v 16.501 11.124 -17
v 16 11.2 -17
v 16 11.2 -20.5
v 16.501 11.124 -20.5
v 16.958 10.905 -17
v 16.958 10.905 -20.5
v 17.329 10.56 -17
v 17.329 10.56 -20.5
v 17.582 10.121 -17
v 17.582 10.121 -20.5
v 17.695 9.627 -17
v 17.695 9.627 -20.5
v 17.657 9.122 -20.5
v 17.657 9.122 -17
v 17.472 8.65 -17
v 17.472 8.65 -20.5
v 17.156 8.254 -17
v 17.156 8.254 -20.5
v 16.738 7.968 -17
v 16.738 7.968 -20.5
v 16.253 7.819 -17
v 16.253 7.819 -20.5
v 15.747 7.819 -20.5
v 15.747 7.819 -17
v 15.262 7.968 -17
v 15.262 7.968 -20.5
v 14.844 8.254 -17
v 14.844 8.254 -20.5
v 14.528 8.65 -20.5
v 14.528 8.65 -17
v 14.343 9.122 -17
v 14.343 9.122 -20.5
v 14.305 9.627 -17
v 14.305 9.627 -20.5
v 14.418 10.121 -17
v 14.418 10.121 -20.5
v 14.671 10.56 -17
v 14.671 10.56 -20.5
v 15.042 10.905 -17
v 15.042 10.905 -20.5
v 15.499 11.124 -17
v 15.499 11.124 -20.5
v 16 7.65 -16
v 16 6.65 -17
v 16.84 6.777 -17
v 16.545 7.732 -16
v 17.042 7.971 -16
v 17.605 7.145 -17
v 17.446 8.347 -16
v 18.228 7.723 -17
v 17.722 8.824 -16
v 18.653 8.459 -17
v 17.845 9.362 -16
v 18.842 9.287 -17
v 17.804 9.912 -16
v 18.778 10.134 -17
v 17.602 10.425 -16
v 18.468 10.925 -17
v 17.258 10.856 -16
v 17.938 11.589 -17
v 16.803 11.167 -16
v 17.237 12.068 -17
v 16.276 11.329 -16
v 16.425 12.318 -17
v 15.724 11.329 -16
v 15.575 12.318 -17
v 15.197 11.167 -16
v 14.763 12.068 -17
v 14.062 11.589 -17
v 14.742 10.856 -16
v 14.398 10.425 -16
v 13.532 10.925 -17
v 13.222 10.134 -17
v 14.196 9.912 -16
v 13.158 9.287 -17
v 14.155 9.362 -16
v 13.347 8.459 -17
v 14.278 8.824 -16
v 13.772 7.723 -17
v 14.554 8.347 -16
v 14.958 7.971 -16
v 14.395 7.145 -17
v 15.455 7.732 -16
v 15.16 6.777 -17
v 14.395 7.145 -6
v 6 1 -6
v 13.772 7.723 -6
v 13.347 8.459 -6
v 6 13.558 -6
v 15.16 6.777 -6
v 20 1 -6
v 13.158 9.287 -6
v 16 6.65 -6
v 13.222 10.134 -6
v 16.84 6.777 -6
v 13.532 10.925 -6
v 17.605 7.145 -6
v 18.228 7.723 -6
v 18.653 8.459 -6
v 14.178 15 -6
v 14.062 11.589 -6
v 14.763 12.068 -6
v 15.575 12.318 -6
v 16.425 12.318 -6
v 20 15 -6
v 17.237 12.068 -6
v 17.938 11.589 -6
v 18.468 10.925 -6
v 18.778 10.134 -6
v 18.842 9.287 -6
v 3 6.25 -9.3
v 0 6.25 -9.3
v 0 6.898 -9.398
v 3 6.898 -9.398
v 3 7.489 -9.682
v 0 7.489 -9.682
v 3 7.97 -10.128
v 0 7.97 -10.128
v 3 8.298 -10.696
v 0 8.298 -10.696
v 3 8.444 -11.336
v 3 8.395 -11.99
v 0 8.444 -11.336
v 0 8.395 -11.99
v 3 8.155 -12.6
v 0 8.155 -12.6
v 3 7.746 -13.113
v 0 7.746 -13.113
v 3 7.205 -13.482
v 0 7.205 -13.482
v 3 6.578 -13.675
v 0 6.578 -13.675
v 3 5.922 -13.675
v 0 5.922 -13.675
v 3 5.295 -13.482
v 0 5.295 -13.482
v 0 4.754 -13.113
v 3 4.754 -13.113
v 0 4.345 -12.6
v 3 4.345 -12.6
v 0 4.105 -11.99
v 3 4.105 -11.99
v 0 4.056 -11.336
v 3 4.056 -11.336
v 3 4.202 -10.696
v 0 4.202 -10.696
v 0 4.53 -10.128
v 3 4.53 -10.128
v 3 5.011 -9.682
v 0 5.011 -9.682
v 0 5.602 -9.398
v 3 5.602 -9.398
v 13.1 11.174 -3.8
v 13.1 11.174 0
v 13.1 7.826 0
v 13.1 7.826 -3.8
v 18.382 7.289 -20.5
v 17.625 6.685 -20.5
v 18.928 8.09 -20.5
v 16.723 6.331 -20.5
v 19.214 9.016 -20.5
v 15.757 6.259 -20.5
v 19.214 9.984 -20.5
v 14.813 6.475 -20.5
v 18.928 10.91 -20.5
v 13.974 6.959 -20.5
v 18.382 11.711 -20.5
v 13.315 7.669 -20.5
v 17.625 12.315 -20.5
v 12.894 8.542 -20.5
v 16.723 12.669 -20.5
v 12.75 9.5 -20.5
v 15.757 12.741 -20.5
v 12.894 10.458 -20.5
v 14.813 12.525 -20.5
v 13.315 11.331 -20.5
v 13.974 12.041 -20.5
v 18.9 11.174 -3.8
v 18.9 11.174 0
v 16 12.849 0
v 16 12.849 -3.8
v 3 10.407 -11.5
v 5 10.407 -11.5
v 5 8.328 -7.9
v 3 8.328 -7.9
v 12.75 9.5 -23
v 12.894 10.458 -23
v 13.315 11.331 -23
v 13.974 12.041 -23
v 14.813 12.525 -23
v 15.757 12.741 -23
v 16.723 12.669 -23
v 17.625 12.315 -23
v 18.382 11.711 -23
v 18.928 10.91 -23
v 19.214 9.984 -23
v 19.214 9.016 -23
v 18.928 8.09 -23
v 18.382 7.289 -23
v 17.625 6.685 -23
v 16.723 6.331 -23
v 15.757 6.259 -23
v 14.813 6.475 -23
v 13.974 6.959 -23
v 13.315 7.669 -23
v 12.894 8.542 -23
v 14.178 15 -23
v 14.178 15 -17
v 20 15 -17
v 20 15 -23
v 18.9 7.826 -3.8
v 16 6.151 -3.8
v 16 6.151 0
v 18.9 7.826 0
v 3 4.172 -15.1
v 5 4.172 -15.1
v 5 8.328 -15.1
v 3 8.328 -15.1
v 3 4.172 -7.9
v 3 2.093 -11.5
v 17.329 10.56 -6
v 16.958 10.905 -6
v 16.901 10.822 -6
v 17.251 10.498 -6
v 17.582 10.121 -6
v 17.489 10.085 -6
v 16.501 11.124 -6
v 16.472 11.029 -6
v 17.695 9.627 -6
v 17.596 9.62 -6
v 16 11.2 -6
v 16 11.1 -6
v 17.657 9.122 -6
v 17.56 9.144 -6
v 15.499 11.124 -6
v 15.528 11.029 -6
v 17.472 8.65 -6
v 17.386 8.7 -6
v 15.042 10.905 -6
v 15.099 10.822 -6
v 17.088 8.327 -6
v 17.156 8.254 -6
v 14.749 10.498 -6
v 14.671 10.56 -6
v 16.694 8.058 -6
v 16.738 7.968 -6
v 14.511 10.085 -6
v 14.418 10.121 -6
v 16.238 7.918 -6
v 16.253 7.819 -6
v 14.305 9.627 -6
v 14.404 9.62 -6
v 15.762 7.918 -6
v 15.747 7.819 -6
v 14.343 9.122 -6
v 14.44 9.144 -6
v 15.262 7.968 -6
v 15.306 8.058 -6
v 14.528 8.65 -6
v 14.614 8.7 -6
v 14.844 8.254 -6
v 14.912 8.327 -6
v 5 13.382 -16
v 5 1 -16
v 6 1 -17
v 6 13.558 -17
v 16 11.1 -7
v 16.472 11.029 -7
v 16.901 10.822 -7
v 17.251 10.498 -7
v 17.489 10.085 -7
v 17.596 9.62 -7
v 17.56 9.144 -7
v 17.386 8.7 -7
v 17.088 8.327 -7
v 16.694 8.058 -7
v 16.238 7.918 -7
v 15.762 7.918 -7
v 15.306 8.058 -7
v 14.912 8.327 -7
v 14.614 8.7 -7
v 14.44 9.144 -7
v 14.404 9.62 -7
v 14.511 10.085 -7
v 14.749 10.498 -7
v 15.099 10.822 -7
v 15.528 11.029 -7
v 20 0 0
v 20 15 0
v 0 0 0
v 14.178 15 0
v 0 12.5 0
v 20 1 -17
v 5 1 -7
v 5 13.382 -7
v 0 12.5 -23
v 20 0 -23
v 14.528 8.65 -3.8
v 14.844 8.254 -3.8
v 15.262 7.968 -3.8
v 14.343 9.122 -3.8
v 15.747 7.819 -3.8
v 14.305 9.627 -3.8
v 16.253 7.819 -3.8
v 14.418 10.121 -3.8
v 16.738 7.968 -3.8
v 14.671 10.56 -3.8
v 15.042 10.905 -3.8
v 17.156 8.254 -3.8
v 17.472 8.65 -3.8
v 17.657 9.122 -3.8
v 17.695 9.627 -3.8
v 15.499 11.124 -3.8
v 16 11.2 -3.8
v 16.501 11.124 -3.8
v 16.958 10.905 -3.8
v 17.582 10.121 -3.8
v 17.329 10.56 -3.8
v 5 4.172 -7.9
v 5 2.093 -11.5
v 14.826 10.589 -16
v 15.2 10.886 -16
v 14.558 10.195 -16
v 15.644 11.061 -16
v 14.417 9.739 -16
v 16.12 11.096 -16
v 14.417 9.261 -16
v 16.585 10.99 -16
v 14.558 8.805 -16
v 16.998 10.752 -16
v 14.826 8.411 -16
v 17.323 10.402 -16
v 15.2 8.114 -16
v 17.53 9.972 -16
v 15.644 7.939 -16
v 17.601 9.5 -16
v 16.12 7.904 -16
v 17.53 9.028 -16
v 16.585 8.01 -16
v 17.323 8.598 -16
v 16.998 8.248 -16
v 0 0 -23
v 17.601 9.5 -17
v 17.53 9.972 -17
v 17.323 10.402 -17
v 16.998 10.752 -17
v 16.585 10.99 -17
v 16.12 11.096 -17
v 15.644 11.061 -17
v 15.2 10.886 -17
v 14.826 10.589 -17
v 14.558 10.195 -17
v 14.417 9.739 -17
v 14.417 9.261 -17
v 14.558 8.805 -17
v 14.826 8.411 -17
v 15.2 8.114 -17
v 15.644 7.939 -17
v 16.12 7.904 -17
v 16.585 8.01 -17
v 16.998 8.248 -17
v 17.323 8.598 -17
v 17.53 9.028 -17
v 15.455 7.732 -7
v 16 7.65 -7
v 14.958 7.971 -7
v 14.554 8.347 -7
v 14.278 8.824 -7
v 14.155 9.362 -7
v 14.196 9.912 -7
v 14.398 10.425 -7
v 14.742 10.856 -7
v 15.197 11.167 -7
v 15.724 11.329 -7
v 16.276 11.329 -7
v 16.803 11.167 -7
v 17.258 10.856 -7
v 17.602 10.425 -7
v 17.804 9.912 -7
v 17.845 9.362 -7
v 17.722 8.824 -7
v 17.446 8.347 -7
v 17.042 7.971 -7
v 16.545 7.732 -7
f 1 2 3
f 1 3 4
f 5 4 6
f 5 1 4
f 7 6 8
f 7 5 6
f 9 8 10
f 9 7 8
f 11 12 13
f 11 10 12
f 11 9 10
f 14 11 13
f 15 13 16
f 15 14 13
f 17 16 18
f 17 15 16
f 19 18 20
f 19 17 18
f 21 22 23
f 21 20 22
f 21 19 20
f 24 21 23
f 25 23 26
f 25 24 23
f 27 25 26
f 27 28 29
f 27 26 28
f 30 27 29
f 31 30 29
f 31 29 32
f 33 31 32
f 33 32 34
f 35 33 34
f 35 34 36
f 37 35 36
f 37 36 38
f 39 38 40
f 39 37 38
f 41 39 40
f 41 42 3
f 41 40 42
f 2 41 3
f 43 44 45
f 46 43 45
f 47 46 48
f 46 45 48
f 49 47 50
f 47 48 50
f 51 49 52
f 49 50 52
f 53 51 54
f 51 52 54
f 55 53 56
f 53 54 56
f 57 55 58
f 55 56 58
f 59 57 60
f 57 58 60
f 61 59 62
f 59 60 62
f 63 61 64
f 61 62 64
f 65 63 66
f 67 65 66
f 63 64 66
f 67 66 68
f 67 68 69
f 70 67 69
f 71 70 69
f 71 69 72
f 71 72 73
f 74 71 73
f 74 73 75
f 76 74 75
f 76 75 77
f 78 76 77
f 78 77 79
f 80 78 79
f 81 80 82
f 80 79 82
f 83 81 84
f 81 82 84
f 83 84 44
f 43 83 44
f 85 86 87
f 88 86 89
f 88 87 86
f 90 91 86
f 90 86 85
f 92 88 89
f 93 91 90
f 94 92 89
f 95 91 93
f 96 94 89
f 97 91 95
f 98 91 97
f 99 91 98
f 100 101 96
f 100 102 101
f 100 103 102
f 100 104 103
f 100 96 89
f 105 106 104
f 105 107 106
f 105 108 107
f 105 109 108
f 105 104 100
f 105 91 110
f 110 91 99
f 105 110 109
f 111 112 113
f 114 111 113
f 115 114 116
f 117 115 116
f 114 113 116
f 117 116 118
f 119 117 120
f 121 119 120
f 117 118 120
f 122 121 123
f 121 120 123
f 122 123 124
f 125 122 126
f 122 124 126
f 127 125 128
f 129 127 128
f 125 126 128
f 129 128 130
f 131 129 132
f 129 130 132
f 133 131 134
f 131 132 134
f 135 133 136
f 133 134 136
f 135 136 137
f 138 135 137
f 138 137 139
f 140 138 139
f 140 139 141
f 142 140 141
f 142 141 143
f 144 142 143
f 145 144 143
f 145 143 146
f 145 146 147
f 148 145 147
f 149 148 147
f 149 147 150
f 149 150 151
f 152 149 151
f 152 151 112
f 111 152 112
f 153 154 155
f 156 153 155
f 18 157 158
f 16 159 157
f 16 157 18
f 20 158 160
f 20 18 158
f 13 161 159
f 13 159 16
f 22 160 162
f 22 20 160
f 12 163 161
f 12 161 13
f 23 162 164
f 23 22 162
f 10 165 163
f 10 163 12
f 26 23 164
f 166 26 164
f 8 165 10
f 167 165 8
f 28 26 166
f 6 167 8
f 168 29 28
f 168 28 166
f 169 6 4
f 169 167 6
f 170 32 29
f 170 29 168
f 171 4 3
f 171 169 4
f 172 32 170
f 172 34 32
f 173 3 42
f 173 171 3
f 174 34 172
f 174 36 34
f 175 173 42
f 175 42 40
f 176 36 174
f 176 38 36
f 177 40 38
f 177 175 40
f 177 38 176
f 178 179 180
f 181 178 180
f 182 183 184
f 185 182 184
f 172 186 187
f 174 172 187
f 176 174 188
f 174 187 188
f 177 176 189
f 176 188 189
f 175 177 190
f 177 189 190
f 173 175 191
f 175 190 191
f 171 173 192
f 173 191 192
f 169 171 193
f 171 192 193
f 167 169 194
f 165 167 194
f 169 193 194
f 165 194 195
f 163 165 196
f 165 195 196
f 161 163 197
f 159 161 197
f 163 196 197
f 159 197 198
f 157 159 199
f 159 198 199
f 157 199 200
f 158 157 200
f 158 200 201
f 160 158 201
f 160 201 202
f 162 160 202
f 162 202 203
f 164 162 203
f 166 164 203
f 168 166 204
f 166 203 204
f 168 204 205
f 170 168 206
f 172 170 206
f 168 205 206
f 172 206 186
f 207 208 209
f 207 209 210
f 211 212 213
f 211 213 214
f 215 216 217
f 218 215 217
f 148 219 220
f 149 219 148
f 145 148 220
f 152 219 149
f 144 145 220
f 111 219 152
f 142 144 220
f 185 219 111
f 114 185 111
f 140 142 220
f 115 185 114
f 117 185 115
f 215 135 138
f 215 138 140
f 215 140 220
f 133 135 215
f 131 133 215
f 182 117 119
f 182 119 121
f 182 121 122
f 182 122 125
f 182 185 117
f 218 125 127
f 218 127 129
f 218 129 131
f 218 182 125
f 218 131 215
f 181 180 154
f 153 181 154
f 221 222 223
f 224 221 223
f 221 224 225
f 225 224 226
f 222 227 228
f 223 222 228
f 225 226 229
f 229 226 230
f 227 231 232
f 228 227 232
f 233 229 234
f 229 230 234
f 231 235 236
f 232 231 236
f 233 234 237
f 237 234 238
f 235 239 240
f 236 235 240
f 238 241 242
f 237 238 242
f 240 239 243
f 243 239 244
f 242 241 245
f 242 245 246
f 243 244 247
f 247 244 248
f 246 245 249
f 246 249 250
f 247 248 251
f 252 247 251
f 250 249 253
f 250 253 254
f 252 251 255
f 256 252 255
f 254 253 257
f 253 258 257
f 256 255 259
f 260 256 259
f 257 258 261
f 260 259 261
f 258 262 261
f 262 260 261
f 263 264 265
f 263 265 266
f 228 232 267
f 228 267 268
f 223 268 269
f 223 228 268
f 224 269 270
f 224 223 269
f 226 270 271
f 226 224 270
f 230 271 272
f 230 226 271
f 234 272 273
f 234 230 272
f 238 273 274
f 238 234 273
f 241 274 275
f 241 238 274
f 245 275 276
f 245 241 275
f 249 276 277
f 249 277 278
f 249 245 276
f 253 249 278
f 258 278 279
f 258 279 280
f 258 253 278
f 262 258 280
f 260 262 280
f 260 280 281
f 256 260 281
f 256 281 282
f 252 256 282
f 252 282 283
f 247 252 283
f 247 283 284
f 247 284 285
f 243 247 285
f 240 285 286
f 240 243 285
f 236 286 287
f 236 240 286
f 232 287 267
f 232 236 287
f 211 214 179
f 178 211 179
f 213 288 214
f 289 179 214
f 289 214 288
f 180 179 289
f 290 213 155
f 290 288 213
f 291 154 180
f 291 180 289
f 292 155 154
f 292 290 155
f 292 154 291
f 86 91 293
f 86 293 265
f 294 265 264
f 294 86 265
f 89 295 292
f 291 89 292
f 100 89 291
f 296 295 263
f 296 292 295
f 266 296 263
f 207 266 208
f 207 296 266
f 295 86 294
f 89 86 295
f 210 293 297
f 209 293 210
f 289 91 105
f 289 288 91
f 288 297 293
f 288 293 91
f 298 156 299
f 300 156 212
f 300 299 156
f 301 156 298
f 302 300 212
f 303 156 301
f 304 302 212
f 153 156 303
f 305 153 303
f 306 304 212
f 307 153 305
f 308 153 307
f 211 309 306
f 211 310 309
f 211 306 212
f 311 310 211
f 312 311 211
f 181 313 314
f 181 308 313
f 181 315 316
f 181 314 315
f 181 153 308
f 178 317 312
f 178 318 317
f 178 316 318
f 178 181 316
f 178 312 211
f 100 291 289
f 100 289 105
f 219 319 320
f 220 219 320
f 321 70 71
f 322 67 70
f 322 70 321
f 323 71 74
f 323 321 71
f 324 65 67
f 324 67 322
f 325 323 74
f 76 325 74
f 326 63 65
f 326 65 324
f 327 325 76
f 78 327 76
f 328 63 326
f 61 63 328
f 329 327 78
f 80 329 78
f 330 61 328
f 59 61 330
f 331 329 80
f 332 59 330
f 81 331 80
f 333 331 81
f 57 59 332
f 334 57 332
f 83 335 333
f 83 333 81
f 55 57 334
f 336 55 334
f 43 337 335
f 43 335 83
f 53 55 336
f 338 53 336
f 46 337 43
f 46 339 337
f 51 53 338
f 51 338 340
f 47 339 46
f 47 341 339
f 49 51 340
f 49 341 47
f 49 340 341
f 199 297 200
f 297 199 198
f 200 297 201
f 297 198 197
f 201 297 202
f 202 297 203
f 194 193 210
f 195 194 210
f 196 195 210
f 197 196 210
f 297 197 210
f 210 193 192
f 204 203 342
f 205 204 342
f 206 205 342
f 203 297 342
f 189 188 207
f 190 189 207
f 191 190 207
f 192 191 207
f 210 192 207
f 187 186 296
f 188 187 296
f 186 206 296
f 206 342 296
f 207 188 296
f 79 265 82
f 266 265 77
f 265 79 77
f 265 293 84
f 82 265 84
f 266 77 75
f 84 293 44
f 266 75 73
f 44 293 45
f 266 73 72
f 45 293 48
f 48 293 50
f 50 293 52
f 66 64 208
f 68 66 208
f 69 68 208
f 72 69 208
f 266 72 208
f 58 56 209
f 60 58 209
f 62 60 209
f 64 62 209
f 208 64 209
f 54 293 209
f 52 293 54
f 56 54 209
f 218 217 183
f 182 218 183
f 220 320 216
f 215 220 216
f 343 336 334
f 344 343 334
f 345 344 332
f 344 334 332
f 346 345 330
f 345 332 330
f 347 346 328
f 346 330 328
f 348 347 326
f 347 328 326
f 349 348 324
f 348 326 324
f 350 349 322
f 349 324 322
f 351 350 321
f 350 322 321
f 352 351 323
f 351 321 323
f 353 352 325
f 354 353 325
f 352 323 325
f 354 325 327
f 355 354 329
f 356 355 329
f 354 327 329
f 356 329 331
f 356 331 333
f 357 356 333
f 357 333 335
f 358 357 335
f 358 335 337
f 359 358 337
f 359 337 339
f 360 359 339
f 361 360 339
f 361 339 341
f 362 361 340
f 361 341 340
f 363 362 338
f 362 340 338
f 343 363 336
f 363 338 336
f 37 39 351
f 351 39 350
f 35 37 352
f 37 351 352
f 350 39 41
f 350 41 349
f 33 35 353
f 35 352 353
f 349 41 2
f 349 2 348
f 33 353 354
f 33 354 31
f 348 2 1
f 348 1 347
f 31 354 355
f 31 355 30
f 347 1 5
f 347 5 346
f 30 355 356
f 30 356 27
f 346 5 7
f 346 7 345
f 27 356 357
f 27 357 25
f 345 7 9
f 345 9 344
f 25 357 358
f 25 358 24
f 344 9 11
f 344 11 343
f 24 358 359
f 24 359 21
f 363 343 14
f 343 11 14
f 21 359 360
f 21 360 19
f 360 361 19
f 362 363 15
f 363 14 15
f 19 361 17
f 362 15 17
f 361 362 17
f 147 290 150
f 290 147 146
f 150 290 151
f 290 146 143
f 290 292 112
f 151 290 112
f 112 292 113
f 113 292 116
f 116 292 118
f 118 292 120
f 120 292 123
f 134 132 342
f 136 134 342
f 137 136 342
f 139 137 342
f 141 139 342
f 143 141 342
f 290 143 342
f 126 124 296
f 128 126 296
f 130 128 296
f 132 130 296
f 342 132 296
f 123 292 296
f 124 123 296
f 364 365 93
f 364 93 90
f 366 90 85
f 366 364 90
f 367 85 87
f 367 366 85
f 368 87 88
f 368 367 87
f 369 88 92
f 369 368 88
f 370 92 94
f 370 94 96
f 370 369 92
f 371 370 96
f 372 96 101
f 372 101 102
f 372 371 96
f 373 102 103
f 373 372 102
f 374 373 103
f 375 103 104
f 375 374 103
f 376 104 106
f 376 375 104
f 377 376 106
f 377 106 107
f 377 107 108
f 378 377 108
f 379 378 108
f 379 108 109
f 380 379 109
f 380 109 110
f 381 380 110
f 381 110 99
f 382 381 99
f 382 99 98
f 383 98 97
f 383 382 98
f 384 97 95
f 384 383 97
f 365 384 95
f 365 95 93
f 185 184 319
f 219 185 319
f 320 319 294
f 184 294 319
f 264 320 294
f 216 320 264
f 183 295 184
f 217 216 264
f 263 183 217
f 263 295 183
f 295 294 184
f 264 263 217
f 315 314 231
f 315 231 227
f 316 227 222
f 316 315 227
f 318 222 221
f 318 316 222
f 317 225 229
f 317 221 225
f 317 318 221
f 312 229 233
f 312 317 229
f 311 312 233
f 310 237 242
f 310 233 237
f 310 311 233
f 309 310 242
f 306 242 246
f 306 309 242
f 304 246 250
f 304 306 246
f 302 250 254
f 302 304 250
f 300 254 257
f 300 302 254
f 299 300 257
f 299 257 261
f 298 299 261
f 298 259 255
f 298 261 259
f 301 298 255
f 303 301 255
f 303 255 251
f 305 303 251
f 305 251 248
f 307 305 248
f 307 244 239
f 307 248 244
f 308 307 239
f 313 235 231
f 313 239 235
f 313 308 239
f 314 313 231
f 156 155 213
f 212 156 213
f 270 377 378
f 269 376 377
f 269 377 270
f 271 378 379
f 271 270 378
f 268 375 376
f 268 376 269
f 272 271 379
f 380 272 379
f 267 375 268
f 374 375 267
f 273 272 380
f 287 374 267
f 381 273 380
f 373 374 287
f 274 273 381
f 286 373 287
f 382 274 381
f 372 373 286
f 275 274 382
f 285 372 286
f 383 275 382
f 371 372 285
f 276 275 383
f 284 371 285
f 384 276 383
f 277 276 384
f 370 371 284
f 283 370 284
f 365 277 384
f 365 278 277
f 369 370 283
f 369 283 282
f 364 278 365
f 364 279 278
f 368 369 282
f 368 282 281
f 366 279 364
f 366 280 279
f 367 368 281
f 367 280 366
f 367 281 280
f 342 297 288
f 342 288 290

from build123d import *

# Parameters (mm, degrees)
SKETCH1_W               = 23
SKETCH1_H               = 15
BOSS_EXTRUDE1_DEPTH     = 20
SKETCH2_W               = 11
SKETCH2_H               = 15
CUT_EXTRUDE1_DEPTH      = 15
CUT_EXTRUDE2_DEPTH      = 34.970575503
CUT_EXTRUDE2_DEPTH_BACK = 34.970575503
SKETCH3_R               = 1.7
CHAMFER1_SIZE           = 2.5
CHAMFER1_SIZE_2         = 14.178204549
SKETCH4_R               = 2.2
CUT_EXTRUDE3_DEPTH      = 10
CUT_EXTRUDE4_DEPTH      = 2
SKETCH6_R               = 3.25
CUT_EXTRUDE5_DEPTH      = 2.5
CUT_EXTRUDE6_DEPTH      = 3.8
CHAMFER3_SIZE           = 1
SKETCH9_R               = 1.85
SKETCH9_R_2             = 1.6
BOSS_EXTRUDE2_DEPTH     = 1
BOSS_EXTRUDE3_START     = 1
SKETCH8_R               = 1.85
SKETCH8_R_2             = 1.600864578
BOSS_EXTRUDE3_DEPTH     = 1
CHAMFER4_SIZE           = 1
BOSS_EXTRUDE4_START     = -17
SKETCH10_W              = 20
SKETCH10_H              = 1
BOSS_EXTRUDE4_DEPTH     = 11


# Some blends are built 0.0001 mm under size
with BuildPart() as part:
    # Sketch1 → Boss-Extrude1 (new body)
    with BuildSketch(Plane(origin=(0, 0, 0), x_dir=(0, 0, -1), z_dir=(1, 0, 0))):
        with Locations((11.5, 7.5)):
            Rectangle(SKETCH1_W, SKETCH1_H)
    extrude(amount=BOSS_EXTRUDE1_DEPTH)

    # Sketch2 → Cut-Extrude1 (cut)
    with BuildSketch(Plane(origin=(20, 0, 0), x_dir=(0, 0, -1), z_dir=(1, 0, 0))):
        with Locations((11.5, 7.5)):
            Rectangle(SKETCH2_W, SKETCH2_H)
    extrude(amount=-CUT_EXTRUDE1_DEPTH, mode=Mode.SUBTRACT)

    # Sketch3 → Cut-Extrude2 (cut, two sides: drawn at the far end of the back side and taken through both)
    with BuildSketch(Plane(origin=(0, 0, -23), x_dir=(-1, 0, 0), z_dir=(0, 0, -1)).offset(-CUT_EXTRUDE2_DEPTH_BACK)):
        with Locations(Location((-16, 9.5, 0), (0, 0, 90))):
            Circle(SKETCH3_R)
    extrude(amount=CUT_EXTRUDE2_DEPTH + CUT_EXTRUDE2_DEPTH_BACK, mode=Mode.SUBTRACT)

    # Chamfer1
    # the kernel refuses this chamfer: 14.178204549, 2.5 mm, written as the material it takes off along each edge
    with BuildSketch(Plane(origin=(0, 15, -59.842614584), x_dir=(-0.21013876076743537, -0.9776715712462578, 0), z_dir=(0, 0, 1))) as chamfer1_piece_1:
        Polygon((CHAMFER1_SIZE * 0.977671571246, CHAMFER1_SIZE * 0.210138760767), (-CHAMFER1_SIZE_2 * 0.210138760768, CHAMFER1_SIZE_2 * 0.977671571249), (0, 0), align=None)
    extrude(amount=96.685229169, mode=Mode.SUBTRACT)

    # Sketch4 → Cut-Extrude3 (cut)
    with BuildSketch(Plane.ZY):
        with Locations((-11.5, 6.25)):
            Circle(SKETCH4_R)
    extrude(amount=-CUT_EXTRUDE3_DEPTH, mode=Mode.SUBTRACT)

    # Sketch5 → Cut-Extrude4 (cut)
    with BuildSketch(Plane(origin=(5, 0, 0), x_dir=(0, 0, -1), z_dir=(1, 0, 0))):
        Polygon((7.9, 8.328460969), (7.9, 4.171539031), (11.5, 2.093078062), (15.1, 4.171539031), (15.1, 8.328460969), (11.5, 10.406921938), align=None)
    extrude(amount=-CUT_EXTRUDE4_DEPTH, mode=Mode.SUBTRACT)

    # Sketch6 → Cut-Extrude5 (cut)
    with BuildSketch(Plane(origin=(0, 0, -23), x_dir=(-1, 0, 0), z_dir=(0, 0, -1))):
        with Locations((-16, 9.5)):
            Circle(SKETCH6_R)
    extrude(amount=-CUT_EXTRUDE5_DEPTH, mode=Mode.SUBTRACT)

    # Sketch7 → Cut-Extrude6 (cut)
    with BuildSketch(Plane.XY):
        Polygon((13.1, 11.174315781), (13.1, 7.825684219), (16, 6.151368439), (18.9, 7.825684219), (18.9, 11.174315781), (16, 12.848631561), align=None)
    extrude(amount=-CUT_EXTRUDE6_DEPTH, mode=Mode.SUBTRACT)

    # Chamfer3
    chamfer3_edges = [part.edges().sort_by_distance(p)[0] for p in [
        (5, 6.690817452, -17),
        (5, 6.690817452, -6),
    ]]
    chamfer(chamfer3_edges, length=CHAMFER3_SIZE)

    # Sketch9 → Boss-Extrude2 (add)
    with BuildSketch(Plane(origin=(0, 0, -6), x_dir=(-1, 0, 0), z_dir=(0, 0, -1))):
        with Locations(Location((-16, 9.5, 0), (0, 0, 270))):
            Circle(SKETCH9_R)
        with Locations(Location((-16, 9.5, 0), (0, 0, 90))):
            Circle(SKETCH9_R_2, mode=Mode.SUBTRACT)
    extrude(amount=BOSS_EXTRUDE2_DEPTH)

    # Sketch8 → Boss-Extrude3 (add)
    with BuildSketch(Plane.XY.offset(-17).offset(BOSS_EXTRUDE3_START)):
        with Locations(Location((16, 9.5, 0), (0, 0, 270))):
            Circle(SKETCH8_R)
        with Locations((16, 9.5)):
            Circle(SKETCH8_R_2, mode=Mode.SUBTRACT)
    extrude(amount=-BOSS_EXTRUDE3_DEPTH)

    # Chamfer4
    chamfer4_edges = [part.edges().sort_by_distance(p)[0] for p in [
        (16, 11.35, -6),
        (16, 11.35, -17),
    ]]
    chamfer(chamfer4_edges, length=CHAMFER4_SIZE - 0.0001)  # a hair under: the kernel refuses the full size

    # Sketch10 → Boss-Extrude4 (add)
    with BuildSketch(Plane(origin=(0, 0, -23), x_dir=(-1, 0, 0), z_dir=(0, 0, -1)).offset(BOSS_EXTRUDE4_START)):
        with Locations((-10, 0.5)):
            Rectangle(SKETCH10_W, SKETCH10_H)
    extrude(amount=BOSS_EXTRUDE4_DEPTH)


solid = part.part
